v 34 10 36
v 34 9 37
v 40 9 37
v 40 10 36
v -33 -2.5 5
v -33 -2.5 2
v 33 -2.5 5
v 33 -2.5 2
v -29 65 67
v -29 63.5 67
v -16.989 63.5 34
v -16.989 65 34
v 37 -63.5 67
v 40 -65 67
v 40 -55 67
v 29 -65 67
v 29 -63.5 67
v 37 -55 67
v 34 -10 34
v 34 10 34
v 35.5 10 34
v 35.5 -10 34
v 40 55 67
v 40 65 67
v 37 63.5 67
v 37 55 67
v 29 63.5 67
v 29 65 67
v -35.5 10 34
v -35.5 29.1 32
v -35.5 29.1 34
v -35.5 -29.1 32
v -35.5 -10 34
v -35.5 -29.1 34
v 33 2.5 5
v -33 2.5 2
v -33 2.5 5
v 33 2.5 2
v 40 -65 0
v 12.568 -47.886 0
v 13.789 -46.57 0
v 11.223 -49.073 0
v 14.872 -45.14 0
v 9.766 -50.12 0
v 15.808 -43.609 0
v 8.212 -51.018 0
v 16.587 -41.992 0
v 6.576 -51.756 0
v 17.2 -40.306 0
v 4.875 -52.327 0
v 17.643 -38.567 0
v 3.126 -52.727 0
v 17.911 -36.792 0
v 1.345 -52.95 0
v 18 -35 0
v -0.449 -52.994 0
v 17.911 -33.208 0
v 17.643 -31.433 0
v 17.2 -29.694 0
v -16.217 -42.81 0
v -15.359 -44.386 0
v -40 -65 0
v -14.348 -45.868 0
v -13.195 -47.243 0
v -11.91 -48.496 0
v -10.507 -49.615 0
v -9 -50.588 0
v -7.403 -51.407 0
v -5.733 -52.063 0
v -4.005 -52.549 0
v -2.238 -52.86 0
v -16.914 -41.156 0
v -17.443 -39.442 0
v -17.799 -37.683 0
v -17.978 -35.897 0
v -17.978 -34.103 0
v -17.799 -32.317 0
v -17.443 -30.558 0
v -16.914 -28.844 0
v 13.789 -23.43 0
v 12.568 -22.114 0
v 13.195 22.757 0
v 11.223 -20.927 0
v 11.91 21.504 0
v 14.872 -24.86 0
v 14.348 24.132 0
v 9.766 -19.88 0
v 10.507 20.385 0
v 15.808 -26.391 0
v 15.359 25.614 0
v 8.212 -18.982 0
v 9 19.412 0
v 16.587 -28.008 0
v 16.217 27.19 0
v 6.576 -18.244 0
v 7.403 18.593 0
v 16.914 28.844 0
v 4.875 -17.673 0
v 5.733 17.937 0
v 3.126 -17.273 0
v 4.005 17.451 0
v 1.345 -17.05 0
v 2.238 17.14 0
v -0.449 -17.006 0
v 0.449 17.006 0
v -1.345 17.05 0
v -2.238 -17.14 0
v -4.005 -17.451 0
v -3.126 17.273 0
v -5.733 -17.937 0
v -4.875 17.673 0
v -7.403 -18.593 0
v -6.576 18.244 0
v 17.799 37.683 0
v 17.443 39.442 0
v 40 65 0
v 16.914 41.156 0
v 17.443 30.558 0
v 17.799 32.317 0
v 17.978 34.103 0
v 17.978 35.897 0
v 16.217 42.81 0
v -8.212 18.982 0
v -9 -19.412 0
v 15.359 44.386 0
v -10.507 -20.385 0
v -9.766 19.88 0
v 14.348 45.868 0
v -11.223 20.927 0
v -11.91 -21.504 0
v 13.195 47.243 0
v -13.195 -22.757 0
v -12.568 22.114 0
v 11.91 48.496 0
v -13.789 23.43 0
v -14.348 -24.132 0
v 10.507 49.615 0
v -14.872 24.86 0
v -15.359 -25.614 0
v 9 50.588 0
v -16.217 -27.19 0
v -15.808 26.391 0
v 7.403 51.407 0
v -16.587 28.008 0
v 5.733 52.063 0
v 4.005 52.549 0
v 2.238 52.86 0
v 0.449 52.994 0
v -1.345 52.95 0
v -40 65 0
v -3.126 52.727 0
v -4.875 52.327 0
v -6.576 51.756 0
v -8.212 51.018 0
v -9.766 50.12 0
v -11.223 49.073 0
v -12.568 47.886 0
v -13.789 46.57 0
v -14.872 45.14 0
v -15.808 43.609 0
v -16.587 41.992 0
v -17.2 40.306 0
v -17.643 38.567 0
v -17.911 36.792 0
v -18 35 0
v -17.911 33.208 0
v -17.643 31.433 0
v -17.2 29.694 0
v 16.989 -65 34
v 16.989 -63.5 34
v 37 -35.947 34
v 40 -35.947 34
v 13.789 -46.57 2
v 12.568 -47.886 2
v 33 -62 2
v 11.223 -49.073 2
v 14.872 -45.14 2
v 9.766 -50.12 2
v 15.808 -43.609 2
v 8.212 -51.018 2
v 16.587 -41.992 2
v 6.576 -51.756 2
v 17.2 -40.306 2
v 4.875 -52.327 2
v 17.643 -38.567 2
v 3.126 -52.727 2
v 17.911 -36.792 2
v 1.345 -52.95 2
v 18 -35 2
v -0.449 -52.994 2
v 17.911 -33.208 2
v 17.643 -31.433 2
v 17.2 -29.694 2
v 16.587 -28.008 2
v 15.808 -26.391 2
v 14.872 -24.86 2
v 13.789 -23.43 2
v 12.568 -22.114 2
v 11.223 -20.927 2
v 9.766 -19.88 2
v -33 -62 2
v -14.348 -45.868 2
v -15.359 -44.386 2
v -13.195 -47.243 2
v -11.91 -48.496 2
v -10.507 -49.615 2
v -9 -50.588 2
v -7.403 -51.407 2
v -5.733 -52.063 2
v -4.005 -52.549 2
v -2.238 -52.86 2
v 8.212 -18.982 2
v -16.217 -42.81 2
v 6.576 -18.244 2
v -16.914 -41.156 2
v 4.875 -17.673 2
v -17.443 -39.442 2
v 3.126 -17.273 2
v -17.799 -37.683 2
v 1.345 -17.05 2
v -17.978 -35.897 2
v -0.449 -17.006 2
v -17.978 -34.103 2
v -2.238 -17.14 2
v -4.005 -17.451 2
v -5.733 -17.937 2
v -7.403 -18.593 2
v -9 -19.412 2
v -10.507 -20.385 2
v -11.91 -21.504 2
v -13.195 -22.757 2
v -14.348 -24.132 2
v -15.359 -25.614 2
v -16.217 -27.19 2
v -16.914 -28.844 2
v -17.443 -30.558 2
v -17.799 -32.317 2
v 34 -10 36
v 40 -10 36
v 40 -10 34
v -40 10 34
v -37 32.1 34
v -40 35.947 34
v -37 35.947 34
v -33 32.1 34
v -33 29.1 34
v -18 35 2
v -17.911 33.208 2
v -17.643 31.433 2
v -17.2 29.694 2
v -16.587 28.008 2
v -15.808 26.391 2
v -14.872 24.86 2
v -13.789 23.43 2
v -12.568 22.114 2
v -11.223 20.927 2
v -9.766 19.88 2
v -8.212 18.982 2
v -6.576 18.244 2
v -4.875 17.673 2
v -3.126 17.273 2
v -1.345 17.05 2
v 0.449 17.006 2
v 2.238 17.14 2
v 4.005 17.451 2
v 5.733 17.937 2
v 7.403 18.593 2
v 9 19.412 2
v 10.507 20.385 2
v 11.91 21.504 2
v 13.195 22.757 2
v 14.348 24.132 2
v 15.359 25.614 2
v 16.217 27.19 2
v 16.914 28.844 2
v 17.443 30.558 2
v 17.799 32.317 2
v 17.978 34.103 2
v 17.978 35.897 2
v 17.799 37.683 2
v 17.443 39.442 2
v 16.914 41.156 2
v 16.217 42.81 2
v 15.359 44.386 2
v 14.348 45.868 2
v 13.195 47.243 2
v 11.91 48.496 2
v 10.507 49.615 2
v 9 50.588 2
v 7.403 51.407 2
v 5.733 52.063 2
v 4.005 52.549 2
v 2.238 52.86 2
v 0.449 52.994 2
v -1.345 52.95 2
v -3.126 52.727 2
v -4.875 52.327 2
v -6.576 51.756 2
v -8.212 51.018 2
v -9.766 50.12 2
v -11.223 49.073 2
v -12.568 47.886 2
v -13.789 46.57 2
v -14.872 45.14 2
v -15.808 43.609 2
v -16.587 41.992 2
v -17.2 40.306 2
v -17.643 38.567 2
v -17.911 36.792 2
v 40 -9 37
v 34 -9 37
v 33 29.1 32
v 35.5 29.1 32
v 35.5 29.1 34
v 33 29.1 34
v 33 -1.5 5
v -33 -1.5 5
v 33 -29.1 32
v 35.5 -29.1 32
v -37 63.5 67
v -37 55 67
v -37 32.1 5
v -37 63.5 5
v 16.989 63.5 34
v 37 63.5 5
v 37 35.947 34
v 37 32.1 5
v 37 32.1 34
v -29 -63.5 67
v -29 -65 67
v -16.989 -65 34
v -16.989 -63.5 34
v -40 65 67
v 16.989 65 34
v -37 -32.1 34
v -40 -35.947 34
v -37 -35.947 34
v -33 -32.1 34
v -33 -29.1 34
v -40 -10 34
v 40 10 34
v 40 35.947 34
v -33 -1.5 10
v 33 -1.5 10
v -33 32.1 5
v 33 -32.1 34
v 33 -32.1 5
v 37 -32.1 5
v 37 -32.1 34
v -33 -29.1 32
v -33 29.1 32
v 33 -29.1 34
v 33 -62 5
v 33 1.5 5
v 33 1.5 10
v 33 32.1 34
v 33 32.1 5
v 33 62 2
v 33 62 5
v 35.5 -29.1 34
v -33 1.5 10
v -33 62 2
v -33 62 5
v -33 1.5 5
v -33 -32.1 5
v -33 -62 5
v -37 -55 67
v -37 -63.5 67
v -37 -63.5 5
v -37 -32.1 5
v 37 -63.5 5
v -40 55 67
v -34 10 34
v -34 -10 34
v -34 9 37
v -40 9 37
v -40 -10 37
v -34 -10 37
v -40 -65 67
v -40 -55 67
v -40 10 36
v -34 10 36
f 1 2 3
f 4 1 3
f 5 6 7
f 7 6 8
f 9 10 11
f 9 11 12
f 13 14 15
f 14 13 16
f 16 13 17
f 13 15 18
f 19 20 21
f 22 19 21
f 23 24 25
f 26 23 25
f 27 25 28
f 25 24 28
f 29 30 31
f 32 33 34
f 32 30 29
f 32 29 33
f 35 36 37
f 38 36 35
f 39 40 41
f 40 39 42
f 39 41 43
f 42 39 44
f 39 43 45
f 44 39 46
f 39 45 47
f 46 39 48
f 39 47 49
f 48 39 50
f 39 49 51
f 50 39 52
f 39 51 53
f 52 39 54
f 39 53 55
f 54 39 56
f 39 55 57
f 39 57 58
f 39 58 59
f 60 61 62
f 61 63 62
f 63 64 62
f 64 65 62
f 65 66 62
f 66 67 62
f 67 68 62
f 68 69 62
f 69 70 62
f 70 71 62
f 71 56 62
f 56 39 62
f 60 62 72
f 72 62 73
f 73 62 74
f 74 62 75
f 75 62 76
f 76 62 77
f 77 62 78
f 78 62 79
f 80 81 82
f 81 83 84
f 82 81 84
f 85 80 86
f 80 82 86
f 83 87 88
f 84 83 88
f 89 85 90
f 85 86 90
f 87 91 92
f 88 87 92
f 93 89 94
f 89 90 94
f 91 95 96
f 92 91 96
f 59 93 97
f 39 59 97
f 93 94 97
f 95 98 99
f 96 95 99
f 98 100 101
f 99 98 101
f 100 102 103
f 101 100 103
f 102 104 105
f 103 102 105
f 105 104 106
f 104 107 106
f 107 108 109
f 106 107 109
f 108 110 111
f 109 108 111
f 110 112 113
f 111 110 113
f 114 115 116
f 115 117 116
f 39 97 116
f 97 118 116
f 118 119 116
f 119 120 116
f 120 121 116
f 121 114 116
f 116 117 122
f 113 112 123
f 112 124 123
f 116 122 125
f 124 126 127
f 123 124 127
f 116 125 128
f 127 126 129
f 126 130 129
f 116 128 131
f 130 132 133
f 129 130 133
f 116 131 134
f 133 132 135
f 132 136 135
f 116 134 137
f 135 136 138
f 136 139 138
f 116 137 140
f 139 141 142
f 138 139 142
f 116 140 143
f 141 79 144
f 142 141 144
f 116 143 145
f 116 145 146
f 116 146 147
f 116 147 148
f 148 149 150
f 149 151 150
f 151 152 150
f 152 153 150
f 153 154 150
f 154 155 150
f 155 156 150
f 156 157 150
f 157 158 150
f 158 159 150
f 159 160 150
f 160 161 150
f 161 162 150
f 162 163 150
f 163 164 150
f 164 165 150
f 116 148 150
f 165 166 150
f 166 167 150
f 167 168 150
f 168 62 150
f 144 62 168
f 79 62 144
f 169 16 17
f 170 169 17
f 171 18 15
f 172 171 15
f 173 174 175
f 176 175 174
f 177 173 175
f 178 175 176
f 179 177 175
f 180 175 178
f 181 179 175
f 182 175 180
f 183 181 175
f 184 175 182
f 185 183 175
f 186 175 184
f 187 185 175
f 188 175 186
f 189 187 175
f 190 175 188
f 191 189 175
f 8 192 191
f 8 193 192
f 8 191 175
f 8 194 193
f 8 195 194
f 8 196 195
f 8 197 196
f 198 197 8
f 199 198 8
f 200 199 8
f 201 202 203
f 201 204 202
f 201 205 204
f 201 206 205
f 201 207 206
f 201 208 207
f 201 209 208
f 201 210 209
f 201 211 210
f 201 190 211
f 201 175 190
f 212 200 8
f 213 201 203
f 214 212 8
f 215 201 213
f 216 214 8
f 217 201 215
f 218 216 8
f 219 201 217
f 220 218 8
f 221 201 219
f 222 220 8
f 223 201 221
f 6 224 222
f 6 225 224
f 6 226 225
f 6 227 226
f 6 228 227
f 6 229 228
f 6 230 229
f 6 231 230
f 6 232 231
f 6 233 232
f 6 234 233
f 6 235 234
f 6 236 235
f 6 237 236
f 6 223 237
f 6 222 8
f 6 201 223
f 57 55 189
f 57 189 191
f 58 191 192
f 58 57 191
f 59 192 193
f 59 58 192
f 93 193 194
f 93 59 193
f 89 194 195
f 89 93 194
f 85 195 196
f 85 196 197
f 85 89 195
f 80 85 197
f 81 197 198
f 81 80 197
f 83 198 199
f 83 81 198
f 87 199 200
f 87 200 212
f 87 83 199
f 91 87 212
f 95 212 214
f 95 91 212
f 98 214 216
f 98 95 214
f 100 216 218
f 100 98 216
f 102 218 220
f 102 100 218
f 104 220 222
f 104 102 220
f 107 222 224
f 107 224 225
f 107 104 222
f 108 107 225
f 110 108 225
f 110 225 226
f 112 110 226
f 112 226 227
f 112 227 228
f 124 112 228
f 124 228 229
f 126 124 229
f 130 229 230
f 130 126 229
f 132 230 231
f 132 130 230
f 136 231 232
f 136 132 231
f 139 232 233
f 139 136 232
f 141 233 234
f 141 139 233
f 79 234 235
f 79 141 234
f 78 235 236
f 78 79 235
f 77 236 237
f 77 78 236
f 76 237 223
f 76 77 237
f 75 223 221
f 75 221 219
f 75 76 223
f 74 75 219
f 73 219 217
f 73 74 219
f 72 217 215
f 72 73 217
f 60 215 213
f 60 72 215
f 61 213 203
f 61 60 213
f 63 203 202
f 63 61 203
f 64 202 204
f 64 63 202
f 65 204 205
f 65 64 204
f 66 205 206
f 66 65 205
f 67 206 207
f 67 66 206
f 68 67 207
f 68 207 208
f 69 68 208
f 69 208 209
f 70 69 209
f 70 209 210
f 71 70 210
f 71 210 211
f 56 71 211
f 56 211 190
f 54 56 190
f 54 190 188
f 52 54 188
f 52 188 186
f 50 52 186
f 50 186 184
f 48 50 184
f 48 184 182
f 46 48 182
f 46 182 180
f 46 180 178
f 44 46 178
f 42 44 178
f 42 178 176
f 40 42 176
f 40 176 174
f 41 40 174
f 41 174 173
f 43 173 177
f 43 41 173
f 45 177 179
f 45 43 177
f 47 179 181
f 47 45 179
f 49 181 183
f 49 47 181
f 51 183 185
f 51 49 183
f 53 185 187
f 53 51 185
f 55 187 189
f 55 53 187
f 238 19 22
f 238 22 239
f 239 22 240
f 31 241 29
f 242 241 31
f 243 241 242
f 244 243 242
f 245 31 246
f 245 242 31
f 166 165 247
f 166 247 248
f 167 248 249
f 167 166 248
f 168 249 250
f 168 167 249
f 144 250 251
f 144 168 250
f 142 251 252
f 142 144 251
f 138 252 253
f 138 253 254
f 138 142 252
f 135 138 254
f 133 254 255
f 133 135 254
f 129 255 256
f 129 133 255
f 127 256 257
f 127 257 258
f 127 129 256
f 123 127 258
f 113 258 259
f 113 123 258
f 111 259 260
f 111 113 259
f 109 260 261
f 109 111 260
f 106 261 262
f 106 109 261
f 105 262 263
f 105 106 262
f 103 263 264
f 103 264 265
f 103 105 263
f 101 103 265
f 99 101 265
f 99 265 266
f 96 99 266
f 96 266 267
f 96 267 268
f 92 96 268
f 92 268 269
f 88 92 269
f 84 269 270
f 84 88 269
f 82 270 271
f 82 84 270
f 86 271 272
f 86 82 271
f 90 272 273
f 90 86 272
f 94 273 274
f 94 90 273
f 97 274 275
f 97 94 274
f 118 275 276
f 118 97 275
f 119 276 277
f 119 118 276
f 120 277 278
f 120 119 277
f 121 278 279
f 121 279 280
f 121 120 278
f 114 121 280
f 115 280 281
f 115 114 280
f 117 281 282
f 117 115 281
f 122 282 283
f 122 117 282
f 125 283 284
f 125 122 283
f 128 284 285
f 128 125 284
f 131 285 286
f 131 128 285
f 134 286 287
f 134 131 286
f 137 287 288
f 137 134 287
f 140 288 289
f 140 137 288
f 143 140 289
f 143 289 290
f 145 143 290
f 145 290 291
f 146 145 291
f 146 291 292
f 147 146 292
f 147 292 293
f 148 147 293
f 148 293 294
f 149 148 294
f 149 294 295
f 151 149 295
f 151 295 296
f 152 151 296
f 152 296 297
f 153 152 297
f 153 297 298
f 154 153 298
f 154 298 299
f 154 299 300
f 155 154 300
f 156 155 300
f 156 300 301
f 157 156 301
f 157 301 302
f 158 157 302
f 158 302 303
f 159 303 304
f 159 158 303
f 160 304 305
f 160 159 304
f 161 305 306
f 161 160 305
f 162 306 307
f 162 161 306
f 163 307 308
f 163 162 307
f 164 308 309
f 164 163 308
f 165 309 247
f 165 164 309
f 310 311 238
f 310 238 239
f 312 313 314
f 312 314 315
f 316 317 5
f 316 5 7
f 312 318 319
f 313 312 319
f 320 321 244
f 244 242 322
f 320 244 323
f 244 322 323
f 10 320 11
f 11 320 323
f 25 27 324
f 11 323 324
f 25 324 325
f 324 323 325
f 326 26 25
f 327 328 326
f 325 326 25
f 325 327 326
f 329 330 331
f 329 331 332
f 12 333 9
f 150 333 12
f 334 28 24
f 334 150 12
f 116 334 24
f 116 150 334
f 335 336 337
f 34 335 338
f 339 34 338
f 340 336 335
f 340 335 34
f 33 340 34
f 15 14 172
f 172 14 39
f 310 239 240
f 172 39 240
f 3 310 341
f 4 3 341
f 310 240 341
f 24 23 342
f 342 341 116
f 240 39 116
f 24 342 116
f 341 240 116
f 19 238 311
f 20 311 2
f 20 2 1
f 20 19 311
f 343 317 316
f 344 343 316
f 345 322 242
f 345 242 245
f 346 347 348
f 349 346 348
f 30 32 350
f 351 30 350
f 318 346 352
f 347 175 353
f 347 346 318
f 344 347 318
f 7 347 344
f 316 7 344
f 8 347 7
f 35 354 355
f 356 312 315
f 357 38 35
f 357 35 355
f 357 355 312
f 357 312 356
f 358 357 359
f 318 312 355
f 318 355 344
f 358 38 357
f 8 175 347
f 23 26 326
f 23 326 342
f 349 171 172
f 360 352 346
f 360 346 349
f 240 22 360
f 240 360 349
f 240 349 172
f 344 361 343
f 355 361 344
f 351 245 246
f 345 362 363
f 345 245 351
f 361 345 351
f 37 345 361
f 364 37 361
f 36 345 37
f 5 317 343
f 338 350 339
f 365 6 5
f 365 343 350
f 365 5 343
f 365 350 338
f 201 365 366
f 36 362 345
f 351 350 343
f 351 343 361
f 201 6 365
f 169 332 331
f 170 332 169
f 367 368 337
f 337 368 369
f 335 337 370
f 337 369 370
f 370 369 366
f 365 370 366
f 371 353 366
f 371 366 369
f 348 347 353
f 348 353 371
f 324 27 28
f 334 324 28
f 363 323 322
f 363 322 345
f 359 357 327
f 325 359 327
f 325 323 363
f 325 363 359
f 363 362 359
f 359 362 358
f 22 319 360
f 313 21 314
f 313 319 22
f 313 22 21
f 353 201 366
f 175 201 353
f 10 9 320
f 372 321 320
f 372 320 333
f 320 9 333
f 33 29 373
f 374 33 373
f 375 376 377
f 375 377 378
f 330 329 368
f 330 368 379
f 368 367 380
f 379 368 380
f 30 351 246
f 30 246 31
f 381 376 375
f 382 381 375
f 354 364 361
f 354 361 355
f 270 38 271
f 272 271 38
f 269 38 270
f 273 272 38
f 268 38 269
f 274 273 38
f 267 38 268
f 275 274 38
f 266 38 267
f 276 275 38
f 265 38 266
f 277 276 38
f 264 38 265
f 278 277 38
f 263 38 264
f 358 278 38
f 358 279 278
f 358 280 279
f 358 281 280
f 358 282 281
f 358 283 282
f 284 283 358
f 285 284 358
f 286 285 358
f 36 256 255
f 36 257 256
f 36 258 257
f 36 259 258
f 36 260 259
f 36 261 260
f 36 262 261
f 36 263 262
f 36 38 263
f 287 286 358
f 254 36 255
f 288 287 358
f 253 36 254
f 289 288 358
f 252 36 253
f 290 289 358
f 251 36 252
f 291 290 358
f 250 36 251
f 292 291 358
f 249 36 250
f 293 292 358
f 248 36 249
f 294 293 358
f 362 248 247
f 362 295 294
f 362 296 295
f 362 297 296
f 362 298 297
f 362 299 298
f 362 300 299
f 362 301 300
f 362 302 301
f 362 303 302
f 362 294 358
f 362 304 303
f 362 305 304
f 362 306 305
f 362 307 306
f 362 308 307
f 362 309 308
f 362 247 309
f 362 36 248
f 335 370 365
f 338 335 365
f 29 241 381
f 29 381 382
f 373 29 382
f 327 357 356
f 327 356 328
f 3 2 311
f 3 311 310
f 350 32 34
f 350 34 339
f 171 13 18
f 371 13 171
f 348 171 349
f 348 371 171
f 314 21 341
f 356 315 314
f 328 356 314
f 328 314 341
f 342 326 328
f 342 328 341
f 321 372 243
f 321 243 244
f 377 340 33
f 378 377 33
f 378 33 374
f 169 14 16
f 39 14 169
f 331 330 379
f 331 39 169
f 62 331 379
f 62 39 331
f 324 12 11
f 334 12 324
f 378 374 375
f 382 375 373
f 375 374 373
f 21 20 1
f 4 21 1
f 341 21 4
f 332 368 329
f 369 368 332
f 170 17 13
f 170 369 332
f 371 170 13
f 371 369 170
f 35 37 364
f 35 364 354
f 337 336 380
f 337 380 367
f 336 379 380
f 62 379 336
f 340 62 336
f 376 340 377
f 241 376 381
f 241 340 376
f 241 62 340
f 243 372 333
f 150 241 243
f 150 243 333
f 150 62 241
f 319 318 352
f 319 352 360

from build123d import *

# Parameters (mm, degrees)
SKETCH1_W                    = 130
SKETCH1_H                    = 80
SKETCH1_R                    = 18
BOSS_EXTRUDE1_DEPTH          = 2
SKETCH2_W                    = 7
SKETCH2_H                    = 130
BOSS_EXTRUDE2_DEPTH          = 30
BOSS_EXTRUDE3_DEPTH          = 35
SKETCH5_W                    = 150
SKETCH5_H                    = 110
CUT_EXTRUDE1_DEPTH           = 33
CUT_EXTRUDE1_DRAFT           = -30
SKETCH6_W                    = 6
SKETCH6_H                    = 20
BOSS_EXTRUDE4_DEPTH          = 3
CHAMFER1_SIZE                = 1
SKETCH7_W                    = 80
SKETCH7_H                    = 5
SKETCH7_H_2                  = 3
BOSS_EXTRUDE5_DEPTH          = 3
SKETCH9_W                    = 74
SKETCH9_H                    = 32.9
CUT_EXTRUDE2_DEPTH           = 99.33107342
SKETCH10_W                   = 72.40522931
SKETCH10_H                   = 3
BOSS_EXTRUDE6_DEPTH          = 5
SKETCH11_W                   = 80
SKETCH11_H                   = 1.5
BOSS_EXTRUDE7_DEPTH          = 62
SKETCH12_W                   = 58
SKETCH12_H                   = 28.83651326
CUT_EXTRUDE3_DEPTH           = 33
CUT_EXTRUDE3_DRAFT           = -20
CUT_EXTRUDE3_PROFILE_2_DEPTH = 33
CUT_EXTRUDE3_PROFILE_2_DRAFT = -20


with BuildPart() as part:
    # Sketch1 → Boss-Extrude1 (new body)
    with BuildSketch(Plane(origin=(0, 0, 0), x_dir=(0, 1, 0), z_dir=(0, 0, 1))):
        Rectangle(SKETCH1_W, SKETCH1_H)
        with Locations(Location((-35, 0, 0), (0, 0, 270))):
            Circle(SKETCH1_R, mode=Mode.SUBTRACT)
        with Locations(Location((35, 0, 0), (0, 0, 90))):
            Circle(SKETCH1_R, mode=Mode.SUBTRACT)
    extrude(amount=BOSS_EXTRUDE1_DEPTH)

    # Sketch2 → Boss-Extrude2 (add)
    with BuildSketch(Plane.XY.offset(2)):
        with Locations((-36.5, 0)):
            Rectangle(SKETCH2_W, SKETCH2_H)
        with Locations((36.5, 0)):
            Rectangle(SKETCH2_W, SKETCH2_H)
    extrude(amount=BOSS_EXTRUDE2_DEPTH)

    # Sketch4 → Boss-Extrude3 (add)
    with BuildSketch(Plane.XY.offset(32)):
        Polygon((-33, 29.1), (-35.5, 29.1), (-35.5, -29.1), (-33, -29.1), (-33, -65), (-40, -65), (-40, 65), (-33, 65), align=None)
        Polygon((35.5, -29.1), (35.5, 29.1), (33, 29.1), (33, 65), (40, 65), (40, -65), (33, -65), (33, -29.1), align=None)
    extrude(amount=BOSS_EXTRUDE3_DEPTH)


with BuildPart() as cut_extrude1_tool:
    # Sketch5 → Cut-Extrude1 (with draft: the straight prism first)
    with BuildSketch(Plane.XY.offset(67)):
        Rectangle(SKETCH5_W, SKETCH5_H)
    extrude(amount=-CUT_EXTRUDE1_DEPTH)
    # Cut-Extrude1: the draft: its side faces are tilted about the plane it starts from
    cut_extrude1_sides = [cut_extrude1_tool.faces().sort_by_distance(p)[0] for p in [
        (0, -55, 50.5),
        (75, 0, 50.5),
        (0, 55, 50.5),
        (-75, 0, 50.5),
    ]]
    draft(cut_extrude1_sides, Plane.XY.offset(67), CUT_EXTRUDE1_DRAFT)


with BuildPart() as part_1:
    add(part.part)

    # Cut-Extrude1: cut by cut_extrude1_tool
    add(cut_extrude1_tool.part, mode=Mode.SUBTRACT)

    # Sketch6 → Boss-Extrude4 (add)
    with BuildSketch(Plane.XY.offset(34)):
        with Locations((37, 0)):
            Rectangle(SKETCH6_W, SKETCH6_H)
        with Locations((-37, 0)):
            Rectangle(SKETCH6_W, SKETCH6_H)
    extrude(amount=BOSS_EXTRUDE4_DEPTH)

    # Chamfer1
    chamfer1_edges = [part_1.edges().sort_by_distance(p)[0] for p in [
        (37, 10, 37),
        (37, -10, 37),
        (-37, 10, 37),
    ]]
    chamfer(chamfer1_edges, length=CHAMFER1_SIZE)

    # Sketch7 → Boss-Extrude5 (add)
    with BuildSketch(Plane.XY.offset(2)):
        Rectangle(SKETCH7_W, SKETCH7_H)
        with Locations((0, -63.5)):
            Rectangle(SKETCH7_W, SKETCH7_H_2)
        with Locations((0, 63.5)):
            Rectangle(SKETCH7_W, SKETCH7_H_2)
    extrude(amount=BOSS_EXTRUDE5_DEPTH)

    # Sketch9 → Cut-Extrude2 (cut, through all)
    with BuildSketch(Plane.XY.offset(5)):
        with Locations((0, 48.55)):
            Rectangle(SKETCH9_W, SKETCH9_H)
        with Locations((0, -48.55)):
            Rectangle(SKETCH9_W, SKETCH9_H)
    extrude(amount=CUT_EXTRUDE2_DEPTH, mode=Mode.SUBTRACT)

    # Sketch10 → Boss-Extrude6 (add)
    with BuildSketch(Plane.XY.offset(5)):
        Rectangle(SKETCH10_W, SKETCH10_H)
    extrude(amount=BOSS_EXTRUDE6_DEPTH)

    # Sketch11 → Boss-Extrude7 (add)
    with BuildSketch(Plane.XY.offset(5)):
        with Locations((0, 64.25)):
            Rectangle(SKETCH11_W, SKETCH11_H)
        with Locations((0, -64.25)):
            Rectangle(SKETCH11_W, SKETCH11_H)
    extrude(amount=BOSS_EXTRUDE7_DEPTH)


with BuildPart() as cut_extrude3_tool:
    # Sketch12 → Cut-Extrude3 (with draft: the straight prism first)
    with BuildSketch(Plane.XY.offset(67)):
        with Locations((0, 63.5)):
            Rectangle(SKETCH12_W, SKETCH12_H)
    extrude(amount=-CUT_EXTRUDE3_DEPTH)
    # Cut-Extrude3: the draft: its side faces are tilted about the plane it starts from
    cut_extrude3_sides = [cut_extrude3_tool.faces().sort_by_distance(p)[0] for p in [
        (0, 49.08174337, 50.5),
        (29, 63.5, 50.5),
        (0, 77.91825663, 50.5),
        (-29, 63.5, 50.5),
    ]]
    draft(cut_extrude3_sides, Plane.XY.offset(67), CUT_EXTRUDE3_DRAFT)


with BuildPart() as part_2:
    add(part_1.part)

    # Cut-Extrude3: cut by cut_extrude3_tool
    add(cut_extrude3_tool.part, mode=Mode.SUBTRACT)


with BuildPart() as cut_extrude3_profile_2_tool:
    # Sketch12 → Cut-Extrude3 profile 2 (with draft: the straight prism first)
    with BuildSketch(Plane.XY.offset(67)):
        with Locations((0, -63.5)):
            Rectangle(SKETCH12_W, SKETCH12_H)
    extrude(amount=-CUT_EXTRUDE3_PROFILE_2_DEPTH)
    # Cut-Extrude3 profile 2: the draft: its side faces are tilted about the plane it starts from
    cut_extrude3_profile_2_sides = [cut_extrude3_profile_2_tool.faces().sort_by_distance(p)[0] for p in [
        (-29, -63.5, 50.5),
        (0, -77.91825663, 50.5),
        (29, -63.5, 50.5),
        (0, -49.08174337, 50.5),
    ]]
    draft(cut_extrude3_profile_2_sides, Plane.XY.offset(67), CUT_EXTRUDE3_PROFILE_2_DRAFT)


with BuildPart() as part_3:
    add(part_2.part)

    # Cut-Extrude3 profile 2: cut by cut_extrude3_profile_2_tool
    add(cut_extrude3_profile_2_tool.part, mode=Mode.SUBTRACT)


solid = part_3.part
